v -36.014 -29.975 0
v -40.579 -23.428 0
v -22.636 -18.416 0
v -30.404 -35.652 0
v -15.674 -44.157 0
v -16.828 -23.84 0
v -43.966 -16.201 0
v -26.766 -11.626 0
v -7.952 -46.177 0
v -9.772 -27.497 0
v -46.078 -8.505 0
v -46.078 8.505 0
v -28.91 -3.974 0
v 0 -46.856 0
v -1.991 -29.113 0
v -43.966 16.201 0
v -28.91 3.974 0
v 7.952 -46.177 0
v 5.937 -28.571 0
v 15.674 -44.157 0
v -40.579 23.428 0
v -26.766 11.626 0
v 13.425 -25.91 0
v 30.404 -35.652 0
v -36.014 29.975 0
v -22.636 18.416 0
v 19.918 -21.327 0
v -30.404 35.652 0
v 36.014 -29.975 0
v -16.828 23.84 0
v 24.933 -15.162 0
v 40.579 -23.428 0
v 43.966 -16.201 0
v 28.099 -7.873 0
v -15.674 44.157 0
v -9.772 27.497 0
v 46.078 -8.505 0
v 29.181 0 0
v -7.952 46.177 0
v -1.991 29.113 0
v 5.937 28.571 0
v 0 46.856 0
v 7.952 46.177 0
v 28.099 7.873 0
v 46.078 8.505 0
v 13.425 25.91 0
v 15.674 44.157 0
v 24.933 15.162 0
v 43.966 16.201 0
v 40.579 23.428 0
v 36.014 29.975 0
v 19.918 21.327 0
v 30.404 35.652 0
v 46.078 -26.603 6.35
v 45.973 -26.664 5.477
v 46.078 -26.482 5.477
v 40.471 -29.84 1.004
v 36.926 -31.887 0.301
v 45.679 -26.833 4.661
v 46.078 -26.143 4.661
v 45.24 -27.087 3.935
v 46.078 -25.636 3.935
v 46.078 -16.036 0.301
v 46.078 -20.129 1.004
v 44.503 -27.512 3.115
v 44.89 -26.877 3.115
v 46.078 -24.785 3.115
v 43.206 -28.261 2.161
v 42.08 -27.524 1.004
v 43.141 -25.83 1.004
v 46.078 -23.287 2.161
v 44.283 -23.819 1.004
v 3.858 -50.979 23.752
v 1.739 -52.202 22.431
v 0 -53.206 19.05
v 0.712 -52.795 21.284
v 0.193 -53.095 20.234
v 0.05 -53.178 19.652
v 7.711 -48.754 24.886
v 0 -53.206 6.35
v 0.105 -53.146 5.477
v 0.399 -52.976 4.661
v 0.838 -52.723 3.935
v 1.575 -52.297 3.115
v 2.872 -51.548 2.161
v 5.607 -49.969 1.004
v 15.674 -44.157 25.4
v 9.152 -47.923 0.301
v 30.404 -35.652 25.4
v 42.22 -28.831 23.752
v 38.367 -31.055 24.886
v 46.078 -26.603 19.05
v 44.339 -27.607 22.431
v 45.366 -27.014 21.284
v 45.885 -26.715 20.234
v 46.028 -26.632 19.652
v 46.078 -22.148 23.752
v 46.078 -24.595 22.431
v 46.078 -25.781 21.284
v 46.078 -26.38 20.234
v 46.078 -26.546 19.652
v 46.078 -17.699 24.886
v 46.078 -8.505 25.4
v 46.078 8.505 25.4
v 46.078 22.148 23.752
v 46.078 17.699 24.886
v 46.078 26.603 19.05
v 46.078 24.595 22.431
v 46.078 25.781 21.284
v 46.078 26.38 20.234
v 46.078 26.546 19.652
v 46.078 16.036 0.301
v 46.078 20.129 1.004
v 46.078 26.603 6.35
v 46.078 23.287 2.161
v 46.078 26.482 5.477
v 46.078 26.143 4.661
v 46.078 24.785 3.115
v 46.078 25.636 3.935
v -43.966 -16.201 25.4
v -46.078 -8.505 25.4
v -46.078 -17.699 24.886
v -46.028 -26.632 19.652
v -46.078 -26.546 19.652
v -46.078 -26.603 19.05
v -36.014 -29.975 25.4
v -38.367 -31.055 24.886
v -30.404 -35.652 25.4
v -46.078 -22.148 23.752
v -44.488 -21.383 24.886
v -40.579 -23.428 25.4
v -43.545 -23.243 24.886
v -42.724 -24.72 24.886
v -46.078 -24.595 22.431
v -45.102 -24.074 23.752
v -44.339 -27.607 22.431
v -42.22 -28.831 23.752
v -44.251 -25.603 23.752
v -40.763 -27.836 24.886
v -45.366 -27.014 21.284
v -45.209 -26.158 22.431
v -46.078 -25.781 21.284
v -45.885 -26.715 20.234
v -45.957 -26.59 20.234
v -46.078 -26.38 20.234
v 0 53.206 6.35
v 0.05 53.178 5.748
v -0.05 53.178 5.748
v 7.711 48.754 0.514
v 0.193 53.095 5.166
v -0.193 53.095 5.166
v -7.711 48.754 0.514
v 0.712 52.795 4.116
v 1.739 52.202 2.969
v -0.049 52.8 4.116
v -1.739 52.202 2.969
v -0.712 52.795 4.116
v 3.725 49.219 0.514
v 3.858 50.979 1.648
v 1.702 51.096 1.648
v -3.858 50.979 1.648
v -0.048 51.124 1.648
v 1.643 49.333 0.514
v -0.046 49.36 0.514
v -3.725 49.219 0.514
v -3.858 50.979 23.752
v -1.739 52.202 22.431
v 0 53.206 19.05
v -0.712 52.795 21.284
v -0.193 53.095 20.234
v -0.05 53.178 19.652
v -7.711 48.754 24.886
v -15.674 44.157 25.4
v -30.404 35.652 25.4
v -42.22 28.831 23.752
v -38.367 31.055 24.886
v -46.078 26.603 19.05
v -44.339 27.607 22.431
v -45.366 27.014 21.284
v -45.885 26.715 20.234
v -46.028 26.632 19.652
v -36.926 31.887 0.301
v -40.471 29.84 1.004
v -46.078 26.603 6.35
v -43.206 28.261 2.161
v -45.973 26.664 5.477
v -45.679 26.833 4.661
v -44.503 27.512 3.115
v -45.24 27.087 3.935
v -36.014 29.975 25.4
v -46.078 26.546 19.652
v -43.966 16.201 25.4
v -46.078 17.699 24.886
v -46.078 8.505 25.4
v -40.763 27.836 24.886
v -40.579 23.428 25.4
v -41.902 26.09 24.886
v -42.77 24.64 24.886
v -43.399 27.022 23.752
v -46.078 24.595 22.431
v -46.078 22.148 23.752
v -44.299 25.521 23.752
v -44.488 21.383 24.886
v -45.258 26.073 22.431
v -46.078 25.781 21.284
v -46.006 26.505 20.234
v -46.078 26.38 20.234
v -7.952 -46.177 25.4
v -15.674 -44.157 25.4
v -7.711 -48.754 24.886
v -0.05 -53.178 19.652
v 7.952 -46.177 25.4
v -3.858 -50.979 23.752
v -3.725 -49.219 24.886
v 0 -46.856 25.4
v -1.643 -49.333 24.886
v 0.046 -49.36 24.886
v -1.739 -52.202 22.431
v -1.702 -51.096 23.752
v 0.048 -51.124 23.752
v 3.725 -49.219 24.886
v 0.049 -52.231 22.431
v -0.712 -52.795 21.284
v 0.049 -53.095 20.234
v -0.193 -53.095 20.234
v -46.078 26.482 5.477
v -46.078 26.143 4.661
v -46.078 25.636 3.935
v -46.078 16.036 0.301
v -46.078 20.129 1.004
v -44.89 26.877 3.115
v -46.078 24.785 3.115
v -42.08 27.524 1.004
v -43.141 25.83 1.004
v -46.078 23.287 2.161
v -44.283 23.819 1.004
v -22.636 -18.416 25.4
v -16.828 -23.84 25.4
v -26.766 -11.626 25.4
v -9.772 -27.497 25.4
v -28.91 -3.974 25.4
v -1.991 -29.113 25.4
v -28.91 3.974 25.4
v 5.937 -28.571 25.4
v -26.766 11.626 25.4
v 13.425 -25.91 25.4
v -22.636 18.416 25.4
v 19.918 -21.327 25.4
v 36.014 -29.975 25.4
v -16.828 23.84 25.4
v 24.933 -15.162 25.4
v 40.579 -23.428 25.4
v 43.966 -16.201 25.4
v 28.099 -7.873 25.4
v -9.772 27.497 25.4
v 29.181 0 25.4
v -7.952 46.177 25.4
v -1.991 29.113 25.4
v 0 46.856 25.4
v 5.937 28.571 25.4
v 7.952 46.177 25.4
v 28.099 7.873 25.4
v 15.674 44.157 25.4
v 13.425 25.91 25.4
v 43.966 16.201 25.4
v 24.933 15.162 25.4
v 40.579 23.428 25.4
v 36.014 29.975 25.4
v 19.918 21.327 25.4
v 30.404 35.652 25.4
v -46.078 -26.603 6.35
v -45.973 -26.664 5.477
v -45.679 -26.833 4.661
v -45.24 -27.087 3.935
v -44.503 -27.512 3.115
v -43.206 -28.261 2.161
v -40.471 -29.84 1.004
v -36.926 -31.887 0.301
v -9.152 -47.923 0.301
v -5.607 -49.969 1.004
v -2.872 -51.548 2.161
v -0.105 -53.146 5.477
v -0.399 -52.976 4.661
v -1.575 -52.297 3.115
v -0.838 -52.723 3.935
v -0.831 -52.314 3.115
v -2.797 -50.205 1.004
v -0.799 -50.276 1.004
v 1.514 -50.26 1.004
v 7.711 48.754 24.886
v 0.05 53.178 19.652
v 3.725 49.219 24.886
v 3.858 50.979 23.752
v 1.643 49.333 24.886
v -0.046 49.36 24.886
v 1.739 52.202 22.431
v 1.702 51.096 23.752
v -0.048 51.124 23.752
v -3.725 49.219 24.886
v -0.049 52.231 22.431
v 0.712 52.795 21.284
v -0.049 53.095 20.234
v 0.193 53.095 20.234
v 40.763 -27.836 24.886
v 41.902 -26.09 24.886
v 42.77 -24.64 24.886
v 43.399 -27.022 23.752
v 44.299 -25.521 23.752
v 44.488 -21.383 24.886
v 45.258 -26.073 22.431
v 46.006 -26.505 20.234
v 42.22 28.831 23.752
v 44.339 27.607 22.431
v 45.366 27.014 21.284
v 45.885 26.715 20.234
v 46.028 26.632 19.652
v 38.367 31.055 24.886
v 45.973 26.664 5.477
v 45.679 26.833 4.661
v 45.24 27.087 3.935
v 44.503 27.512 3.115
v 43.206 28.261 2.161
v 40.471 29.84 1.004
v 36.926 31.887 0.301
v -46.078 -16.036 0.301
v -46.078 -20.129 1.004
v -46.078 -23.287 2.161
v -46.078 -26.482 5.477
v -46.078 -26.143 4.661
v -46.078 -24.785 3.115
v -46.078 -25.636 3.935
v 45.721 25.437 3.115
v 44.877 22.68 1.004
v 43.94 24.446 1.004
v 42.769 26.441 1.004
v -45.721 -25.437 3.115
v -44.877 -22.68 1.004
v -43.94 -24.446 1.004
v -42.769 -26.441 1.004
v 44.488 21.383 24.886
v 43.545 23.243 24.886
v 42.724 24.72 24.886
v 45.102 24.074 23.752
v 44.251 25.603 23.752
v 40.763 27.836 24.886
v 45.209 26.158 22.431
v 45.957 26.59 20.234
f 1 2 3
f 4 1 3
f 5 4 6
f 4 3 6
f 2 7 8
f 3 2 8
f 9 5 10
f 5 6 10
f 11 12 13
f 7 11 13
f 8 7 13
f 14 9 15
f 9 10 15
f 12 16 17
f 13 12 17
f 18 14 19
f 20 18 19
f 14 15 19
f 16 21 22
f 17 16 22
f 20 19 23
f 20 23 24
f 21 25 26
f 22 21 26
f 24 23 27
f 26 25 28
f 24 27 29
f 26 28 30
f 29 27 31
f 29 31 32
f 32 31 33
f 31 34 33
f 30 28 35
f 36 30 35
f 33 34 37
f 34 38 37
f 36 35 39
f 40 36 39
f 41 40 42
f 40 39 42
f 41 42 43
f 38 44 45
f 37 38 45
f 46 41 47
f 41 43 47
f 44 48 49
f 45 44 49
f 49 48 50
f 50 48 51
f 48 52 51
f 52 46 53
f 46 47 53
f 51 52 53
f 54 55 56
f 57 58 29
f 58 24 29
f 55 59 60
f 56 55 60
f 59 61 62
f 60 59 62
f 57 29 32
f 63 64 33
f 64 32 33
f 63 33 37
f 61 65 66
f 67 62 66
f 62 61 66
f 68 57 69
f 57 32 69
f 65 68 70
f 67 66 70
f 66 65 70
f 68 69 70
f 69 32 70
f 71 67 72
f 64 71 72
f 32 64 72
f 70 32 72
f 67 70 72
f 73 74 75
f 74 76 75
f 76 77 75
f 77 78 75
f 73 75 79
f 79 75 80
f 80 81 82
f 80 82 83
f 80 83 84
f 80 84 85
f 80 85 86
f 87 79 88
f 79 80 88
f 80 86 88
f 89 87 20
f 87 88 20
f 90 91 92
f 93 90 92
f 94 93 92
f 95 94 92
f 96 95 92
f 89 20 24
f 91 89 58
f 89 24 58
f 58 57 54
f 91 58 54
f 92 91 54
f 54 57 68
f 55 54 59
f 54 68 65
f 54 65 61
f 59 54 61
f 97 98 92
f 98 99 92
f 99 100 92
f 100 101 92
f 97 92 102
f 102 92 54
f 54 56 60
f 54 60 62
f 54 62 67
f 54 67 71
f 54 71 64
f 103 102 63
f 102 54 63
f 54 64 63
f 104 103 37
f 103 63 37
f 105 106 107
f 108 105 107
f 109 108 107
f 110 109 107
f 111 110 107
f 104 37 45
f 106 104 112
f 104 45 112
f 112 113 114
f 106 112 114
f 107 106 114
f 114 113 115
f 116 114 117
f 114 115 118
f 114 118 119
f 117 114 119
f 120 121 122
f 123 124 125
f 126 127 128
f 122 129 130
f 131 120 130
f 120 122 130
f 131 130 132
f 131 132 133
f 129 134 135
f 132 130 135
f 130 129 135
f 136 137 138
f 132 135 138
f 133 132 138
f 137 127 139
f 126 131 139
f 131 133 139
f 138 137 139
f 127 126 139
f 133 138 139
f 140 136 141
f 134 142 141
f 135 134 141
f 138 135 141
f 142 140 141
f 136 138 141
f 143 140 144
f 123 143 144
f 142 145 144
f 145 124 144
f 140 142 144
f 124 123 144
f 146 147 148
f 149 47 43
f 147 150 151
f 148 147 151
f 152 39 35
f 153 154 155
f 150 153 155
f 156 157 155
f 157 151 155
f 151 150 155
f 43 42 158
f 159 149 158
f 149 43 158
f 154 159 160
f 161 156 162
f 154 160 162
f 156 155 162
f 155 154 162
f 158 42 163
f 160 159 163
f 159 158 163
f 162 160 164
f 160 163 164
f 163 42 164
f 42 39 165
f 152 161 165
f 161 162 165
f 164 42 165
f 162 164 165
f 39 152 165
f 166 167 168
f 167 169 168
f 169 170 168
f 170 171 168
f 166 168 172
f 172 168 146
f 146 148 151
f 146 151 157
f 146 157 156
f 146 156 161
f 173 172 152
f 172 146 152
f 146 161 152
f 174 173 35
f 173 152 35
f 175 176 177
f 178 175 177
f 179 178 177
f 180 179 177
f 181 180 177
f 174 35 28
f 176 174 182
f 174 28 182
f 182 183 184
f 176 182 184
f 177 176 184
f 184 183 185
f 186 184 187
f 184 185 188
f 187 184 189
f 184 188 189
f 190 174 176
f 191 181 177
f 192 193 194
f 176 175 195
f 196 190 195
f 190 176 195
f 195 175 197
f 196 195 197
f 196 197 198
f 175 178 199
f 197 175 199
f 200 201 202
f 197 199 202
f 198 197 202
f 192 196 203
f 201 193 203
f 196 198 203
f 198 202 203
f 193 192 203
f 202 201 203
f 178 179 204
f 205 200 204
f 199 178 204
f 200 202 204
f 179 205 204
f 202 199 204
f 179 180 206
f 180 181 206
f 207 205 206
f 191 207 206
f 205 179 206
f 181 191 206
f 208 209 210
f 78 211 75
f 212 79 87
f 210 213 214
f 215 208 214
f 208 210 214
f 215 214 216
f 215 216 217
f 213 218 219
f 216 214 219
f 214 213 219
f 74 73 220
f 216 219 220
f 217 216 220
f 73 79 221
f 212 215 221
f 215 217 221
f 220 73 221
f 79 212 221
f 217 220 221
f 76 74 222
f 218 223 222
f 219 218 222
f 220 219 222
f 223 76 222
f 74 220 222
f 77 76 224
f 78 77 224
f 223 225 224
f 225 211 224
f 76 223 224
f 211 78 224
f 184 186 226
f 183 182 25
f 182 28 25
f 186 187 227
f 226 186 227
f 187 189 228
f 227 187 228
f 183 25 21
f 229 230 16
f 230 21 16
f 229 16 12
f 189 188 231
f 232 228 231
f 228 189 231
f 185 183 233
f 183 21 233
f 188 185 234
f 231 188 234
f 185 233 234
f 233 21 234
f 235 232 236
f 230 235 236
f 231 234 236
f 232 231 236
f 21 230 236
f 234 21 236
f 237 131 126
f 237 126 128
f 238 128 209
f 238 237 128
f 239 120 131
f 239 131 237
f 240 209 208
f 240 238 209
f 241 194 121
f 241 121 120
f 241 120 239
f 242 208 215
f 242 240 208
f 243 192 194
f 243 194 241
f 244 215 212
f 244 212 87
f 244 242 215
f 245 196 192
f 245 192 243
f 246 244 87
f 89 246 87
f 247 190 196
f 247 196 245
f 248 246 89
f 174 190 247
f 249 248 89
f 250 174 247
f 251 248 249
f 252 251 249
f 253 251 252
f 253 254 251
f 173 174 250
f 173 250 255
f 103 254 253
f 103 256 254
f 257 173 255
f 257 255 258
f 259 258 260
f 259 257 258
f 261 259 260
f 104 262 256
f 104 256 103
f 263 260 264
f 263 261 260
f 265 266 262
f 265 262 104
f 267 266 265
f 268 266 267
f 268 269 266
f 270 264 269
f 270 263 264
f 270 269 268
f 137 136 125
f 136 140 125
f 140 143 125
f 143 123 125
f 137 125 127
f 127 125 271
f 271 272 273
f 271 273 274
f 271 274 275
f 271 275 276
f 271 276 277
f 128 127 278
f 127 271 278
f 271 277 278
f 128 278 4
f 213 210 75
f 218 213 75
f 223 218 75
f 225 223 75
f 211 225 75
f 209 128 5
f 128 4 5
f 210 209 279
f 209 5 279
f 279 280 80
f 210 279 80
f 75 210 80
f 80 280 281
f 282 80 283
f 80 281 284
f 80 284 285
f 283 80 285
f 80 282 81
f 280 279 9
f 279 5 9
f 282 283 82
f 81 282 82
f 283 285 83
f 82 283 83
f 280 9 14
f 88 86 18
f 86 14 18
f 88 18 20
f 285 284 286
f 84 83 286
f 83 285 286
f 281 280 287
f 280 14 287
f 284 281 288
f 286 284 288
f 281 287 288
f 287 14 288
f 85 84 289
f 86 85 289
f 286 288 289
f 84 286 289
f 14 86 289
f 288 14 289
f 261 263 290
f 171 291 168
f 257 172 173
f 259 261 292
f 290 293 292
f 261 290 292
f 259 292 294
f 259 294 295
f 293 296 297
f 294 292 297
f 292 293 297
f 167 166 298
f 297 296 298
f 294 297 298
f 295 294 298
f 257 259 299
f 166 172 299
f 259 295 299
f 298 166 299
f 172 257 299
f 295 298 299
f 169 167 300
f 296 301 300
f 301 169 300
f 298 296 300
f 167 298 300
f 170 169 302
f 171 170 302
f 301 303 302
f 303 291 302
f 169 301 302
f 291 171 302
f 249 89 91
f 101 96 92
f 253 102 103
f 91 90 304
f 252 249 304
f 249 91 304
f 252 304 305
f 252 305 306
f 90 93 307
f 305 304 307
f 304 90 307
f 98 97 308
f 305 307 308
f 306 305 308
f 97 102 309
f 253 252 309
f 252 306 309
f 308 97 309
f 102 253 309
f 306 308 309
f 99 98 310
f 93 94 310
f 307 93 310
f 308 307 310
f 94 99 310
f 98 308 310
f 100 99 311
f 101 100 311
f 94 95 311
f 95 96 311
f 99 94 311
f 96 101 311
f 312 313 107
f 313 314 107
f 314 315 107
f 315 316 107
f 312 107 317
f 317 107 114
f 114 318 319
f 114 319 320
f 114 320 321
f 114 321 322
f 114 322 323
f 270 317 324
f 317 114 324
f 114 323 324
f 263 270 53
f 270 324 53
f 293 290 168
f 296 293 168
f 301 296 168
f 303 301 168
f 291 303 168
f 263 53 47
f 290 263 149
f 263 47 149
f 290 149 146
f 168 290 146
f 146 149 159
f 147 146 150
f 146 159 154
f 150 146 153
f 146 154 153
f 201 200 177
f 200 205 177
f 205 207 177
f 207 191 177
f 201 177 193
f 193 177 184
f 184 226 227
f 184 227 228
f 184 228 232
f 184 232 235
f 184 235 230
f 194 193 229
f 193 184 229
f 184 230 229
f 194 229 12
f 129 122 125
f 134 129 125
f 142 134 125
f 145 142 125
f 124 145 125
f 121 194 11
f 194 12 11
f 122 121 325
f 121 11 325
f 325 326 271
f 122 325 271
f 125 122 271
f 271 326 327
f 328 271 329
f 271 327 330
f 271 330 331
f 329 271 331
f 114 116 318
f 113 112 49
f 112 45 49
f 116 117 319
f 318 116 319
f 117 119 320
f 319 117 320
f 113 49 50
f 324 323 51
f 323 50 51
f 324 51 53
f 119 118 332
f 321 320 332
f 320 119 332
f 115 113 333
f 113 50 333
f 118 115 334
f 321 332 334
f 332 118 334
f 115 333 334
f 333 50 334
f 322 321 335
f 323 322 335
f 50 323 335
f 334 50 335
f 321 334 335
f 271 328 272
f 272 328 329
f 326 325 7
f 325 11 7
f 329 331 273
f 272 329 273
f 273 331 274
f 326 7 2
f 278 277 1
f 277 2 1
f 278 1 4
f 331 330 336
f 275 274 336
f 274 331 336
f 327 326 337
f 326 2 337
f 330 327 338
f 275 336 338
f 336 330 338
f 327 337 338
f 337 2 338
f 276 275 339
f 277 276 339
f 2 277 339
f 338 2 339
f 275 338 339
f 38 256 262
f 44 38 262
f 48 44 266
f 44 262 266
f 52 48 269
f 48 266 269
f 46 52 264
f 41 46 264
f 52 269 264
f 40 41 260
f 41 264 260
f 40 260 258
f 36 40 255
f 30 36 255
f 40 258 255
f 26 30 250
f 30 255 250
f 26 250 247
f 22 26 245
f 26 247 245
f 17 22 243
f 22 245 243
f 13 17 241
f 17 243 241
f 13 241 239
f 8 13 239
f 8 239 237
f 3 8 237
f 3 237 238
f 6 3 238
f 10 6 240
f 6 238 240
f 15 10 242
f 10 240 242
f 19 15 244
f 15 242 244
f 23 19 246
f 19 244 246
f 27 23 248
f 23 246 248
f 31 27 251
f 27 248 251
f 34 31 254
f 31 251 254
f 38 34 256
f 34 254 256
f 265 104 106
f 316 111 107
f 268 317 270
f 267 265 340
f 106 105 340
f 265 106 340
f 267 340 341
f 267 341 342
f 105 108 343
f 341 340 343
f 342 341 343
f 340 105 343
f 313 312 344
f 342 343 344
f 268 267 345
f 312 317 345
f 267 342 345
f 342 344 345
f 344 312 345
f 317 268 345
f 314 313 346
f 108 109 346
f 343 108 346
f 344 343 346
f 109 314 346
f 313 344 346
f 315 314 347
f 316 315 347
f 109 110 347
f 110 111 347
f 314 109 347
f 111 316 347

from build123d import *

# Parameters (mm, degrees)
F1_DEPTH = 25.4
F2_R     = 29.1814766443
F3_DEPTH = 25.4


with BuildPart() as f1:
    # F0 (on Top) → F1 (new body)
    with BuildSketch(Plane.XY):
        Polygon((46.0779853165, -26.6031372262), (46.0779853165, 26.6031372262), (0, 53.2062744524), (-46.0779853165, 26.6031372262), (-46.0779853165, -26.6031372262), (0, -53.2062744524), align=None)
    extrude(amount=F1_DEPTH)

    # F2 (on face) → F3 (cut)
    with BuildSketch(Plane.XY.offset(25.4)):
        Circle(F2_R)
    extrude(amount=-F3_DEPTH, mode=Mode.SUBTRACT)

    # F4 (on Right) → F5 (revolve, cut)
    with BuildSketch(Plane.YZ):
        with BuildLine():
            Line((53.2062744524, 25.4), (46.8562744524, 25.4))
            ThreePointArc((46.8562744524, 25.4), (51.3464025129, 23.5401280605), (53.2062744524, 19.05))
            Line((53.2062744524, 19.05), (53.2062744524, 25.4))
        make_face()
    revolve(axis=Axis((0, 0, 25.4), (0, 0, 1)), mode=Mode.SUBTRACT)

    # F6 (on Right) → F7 (revolve, cut)
    with BuildSketch(Plane.YZ):
        with BuildLine():
            Line((53.2062744524, 0), (53.2062744524, 6.35))
            ThreePointArc((53.2062744524, 6.35), (51.3464025129, 1.8598719395), (46.8562744524, 0))
            Line((46.8562744524, 0), (53.2062744524, 0))
        make_face()
    revolve(axis=Axis((0, 0, 25.4), (0, 0, 1)), mode=Mode.SUBTRACT)


solid = f1.part
